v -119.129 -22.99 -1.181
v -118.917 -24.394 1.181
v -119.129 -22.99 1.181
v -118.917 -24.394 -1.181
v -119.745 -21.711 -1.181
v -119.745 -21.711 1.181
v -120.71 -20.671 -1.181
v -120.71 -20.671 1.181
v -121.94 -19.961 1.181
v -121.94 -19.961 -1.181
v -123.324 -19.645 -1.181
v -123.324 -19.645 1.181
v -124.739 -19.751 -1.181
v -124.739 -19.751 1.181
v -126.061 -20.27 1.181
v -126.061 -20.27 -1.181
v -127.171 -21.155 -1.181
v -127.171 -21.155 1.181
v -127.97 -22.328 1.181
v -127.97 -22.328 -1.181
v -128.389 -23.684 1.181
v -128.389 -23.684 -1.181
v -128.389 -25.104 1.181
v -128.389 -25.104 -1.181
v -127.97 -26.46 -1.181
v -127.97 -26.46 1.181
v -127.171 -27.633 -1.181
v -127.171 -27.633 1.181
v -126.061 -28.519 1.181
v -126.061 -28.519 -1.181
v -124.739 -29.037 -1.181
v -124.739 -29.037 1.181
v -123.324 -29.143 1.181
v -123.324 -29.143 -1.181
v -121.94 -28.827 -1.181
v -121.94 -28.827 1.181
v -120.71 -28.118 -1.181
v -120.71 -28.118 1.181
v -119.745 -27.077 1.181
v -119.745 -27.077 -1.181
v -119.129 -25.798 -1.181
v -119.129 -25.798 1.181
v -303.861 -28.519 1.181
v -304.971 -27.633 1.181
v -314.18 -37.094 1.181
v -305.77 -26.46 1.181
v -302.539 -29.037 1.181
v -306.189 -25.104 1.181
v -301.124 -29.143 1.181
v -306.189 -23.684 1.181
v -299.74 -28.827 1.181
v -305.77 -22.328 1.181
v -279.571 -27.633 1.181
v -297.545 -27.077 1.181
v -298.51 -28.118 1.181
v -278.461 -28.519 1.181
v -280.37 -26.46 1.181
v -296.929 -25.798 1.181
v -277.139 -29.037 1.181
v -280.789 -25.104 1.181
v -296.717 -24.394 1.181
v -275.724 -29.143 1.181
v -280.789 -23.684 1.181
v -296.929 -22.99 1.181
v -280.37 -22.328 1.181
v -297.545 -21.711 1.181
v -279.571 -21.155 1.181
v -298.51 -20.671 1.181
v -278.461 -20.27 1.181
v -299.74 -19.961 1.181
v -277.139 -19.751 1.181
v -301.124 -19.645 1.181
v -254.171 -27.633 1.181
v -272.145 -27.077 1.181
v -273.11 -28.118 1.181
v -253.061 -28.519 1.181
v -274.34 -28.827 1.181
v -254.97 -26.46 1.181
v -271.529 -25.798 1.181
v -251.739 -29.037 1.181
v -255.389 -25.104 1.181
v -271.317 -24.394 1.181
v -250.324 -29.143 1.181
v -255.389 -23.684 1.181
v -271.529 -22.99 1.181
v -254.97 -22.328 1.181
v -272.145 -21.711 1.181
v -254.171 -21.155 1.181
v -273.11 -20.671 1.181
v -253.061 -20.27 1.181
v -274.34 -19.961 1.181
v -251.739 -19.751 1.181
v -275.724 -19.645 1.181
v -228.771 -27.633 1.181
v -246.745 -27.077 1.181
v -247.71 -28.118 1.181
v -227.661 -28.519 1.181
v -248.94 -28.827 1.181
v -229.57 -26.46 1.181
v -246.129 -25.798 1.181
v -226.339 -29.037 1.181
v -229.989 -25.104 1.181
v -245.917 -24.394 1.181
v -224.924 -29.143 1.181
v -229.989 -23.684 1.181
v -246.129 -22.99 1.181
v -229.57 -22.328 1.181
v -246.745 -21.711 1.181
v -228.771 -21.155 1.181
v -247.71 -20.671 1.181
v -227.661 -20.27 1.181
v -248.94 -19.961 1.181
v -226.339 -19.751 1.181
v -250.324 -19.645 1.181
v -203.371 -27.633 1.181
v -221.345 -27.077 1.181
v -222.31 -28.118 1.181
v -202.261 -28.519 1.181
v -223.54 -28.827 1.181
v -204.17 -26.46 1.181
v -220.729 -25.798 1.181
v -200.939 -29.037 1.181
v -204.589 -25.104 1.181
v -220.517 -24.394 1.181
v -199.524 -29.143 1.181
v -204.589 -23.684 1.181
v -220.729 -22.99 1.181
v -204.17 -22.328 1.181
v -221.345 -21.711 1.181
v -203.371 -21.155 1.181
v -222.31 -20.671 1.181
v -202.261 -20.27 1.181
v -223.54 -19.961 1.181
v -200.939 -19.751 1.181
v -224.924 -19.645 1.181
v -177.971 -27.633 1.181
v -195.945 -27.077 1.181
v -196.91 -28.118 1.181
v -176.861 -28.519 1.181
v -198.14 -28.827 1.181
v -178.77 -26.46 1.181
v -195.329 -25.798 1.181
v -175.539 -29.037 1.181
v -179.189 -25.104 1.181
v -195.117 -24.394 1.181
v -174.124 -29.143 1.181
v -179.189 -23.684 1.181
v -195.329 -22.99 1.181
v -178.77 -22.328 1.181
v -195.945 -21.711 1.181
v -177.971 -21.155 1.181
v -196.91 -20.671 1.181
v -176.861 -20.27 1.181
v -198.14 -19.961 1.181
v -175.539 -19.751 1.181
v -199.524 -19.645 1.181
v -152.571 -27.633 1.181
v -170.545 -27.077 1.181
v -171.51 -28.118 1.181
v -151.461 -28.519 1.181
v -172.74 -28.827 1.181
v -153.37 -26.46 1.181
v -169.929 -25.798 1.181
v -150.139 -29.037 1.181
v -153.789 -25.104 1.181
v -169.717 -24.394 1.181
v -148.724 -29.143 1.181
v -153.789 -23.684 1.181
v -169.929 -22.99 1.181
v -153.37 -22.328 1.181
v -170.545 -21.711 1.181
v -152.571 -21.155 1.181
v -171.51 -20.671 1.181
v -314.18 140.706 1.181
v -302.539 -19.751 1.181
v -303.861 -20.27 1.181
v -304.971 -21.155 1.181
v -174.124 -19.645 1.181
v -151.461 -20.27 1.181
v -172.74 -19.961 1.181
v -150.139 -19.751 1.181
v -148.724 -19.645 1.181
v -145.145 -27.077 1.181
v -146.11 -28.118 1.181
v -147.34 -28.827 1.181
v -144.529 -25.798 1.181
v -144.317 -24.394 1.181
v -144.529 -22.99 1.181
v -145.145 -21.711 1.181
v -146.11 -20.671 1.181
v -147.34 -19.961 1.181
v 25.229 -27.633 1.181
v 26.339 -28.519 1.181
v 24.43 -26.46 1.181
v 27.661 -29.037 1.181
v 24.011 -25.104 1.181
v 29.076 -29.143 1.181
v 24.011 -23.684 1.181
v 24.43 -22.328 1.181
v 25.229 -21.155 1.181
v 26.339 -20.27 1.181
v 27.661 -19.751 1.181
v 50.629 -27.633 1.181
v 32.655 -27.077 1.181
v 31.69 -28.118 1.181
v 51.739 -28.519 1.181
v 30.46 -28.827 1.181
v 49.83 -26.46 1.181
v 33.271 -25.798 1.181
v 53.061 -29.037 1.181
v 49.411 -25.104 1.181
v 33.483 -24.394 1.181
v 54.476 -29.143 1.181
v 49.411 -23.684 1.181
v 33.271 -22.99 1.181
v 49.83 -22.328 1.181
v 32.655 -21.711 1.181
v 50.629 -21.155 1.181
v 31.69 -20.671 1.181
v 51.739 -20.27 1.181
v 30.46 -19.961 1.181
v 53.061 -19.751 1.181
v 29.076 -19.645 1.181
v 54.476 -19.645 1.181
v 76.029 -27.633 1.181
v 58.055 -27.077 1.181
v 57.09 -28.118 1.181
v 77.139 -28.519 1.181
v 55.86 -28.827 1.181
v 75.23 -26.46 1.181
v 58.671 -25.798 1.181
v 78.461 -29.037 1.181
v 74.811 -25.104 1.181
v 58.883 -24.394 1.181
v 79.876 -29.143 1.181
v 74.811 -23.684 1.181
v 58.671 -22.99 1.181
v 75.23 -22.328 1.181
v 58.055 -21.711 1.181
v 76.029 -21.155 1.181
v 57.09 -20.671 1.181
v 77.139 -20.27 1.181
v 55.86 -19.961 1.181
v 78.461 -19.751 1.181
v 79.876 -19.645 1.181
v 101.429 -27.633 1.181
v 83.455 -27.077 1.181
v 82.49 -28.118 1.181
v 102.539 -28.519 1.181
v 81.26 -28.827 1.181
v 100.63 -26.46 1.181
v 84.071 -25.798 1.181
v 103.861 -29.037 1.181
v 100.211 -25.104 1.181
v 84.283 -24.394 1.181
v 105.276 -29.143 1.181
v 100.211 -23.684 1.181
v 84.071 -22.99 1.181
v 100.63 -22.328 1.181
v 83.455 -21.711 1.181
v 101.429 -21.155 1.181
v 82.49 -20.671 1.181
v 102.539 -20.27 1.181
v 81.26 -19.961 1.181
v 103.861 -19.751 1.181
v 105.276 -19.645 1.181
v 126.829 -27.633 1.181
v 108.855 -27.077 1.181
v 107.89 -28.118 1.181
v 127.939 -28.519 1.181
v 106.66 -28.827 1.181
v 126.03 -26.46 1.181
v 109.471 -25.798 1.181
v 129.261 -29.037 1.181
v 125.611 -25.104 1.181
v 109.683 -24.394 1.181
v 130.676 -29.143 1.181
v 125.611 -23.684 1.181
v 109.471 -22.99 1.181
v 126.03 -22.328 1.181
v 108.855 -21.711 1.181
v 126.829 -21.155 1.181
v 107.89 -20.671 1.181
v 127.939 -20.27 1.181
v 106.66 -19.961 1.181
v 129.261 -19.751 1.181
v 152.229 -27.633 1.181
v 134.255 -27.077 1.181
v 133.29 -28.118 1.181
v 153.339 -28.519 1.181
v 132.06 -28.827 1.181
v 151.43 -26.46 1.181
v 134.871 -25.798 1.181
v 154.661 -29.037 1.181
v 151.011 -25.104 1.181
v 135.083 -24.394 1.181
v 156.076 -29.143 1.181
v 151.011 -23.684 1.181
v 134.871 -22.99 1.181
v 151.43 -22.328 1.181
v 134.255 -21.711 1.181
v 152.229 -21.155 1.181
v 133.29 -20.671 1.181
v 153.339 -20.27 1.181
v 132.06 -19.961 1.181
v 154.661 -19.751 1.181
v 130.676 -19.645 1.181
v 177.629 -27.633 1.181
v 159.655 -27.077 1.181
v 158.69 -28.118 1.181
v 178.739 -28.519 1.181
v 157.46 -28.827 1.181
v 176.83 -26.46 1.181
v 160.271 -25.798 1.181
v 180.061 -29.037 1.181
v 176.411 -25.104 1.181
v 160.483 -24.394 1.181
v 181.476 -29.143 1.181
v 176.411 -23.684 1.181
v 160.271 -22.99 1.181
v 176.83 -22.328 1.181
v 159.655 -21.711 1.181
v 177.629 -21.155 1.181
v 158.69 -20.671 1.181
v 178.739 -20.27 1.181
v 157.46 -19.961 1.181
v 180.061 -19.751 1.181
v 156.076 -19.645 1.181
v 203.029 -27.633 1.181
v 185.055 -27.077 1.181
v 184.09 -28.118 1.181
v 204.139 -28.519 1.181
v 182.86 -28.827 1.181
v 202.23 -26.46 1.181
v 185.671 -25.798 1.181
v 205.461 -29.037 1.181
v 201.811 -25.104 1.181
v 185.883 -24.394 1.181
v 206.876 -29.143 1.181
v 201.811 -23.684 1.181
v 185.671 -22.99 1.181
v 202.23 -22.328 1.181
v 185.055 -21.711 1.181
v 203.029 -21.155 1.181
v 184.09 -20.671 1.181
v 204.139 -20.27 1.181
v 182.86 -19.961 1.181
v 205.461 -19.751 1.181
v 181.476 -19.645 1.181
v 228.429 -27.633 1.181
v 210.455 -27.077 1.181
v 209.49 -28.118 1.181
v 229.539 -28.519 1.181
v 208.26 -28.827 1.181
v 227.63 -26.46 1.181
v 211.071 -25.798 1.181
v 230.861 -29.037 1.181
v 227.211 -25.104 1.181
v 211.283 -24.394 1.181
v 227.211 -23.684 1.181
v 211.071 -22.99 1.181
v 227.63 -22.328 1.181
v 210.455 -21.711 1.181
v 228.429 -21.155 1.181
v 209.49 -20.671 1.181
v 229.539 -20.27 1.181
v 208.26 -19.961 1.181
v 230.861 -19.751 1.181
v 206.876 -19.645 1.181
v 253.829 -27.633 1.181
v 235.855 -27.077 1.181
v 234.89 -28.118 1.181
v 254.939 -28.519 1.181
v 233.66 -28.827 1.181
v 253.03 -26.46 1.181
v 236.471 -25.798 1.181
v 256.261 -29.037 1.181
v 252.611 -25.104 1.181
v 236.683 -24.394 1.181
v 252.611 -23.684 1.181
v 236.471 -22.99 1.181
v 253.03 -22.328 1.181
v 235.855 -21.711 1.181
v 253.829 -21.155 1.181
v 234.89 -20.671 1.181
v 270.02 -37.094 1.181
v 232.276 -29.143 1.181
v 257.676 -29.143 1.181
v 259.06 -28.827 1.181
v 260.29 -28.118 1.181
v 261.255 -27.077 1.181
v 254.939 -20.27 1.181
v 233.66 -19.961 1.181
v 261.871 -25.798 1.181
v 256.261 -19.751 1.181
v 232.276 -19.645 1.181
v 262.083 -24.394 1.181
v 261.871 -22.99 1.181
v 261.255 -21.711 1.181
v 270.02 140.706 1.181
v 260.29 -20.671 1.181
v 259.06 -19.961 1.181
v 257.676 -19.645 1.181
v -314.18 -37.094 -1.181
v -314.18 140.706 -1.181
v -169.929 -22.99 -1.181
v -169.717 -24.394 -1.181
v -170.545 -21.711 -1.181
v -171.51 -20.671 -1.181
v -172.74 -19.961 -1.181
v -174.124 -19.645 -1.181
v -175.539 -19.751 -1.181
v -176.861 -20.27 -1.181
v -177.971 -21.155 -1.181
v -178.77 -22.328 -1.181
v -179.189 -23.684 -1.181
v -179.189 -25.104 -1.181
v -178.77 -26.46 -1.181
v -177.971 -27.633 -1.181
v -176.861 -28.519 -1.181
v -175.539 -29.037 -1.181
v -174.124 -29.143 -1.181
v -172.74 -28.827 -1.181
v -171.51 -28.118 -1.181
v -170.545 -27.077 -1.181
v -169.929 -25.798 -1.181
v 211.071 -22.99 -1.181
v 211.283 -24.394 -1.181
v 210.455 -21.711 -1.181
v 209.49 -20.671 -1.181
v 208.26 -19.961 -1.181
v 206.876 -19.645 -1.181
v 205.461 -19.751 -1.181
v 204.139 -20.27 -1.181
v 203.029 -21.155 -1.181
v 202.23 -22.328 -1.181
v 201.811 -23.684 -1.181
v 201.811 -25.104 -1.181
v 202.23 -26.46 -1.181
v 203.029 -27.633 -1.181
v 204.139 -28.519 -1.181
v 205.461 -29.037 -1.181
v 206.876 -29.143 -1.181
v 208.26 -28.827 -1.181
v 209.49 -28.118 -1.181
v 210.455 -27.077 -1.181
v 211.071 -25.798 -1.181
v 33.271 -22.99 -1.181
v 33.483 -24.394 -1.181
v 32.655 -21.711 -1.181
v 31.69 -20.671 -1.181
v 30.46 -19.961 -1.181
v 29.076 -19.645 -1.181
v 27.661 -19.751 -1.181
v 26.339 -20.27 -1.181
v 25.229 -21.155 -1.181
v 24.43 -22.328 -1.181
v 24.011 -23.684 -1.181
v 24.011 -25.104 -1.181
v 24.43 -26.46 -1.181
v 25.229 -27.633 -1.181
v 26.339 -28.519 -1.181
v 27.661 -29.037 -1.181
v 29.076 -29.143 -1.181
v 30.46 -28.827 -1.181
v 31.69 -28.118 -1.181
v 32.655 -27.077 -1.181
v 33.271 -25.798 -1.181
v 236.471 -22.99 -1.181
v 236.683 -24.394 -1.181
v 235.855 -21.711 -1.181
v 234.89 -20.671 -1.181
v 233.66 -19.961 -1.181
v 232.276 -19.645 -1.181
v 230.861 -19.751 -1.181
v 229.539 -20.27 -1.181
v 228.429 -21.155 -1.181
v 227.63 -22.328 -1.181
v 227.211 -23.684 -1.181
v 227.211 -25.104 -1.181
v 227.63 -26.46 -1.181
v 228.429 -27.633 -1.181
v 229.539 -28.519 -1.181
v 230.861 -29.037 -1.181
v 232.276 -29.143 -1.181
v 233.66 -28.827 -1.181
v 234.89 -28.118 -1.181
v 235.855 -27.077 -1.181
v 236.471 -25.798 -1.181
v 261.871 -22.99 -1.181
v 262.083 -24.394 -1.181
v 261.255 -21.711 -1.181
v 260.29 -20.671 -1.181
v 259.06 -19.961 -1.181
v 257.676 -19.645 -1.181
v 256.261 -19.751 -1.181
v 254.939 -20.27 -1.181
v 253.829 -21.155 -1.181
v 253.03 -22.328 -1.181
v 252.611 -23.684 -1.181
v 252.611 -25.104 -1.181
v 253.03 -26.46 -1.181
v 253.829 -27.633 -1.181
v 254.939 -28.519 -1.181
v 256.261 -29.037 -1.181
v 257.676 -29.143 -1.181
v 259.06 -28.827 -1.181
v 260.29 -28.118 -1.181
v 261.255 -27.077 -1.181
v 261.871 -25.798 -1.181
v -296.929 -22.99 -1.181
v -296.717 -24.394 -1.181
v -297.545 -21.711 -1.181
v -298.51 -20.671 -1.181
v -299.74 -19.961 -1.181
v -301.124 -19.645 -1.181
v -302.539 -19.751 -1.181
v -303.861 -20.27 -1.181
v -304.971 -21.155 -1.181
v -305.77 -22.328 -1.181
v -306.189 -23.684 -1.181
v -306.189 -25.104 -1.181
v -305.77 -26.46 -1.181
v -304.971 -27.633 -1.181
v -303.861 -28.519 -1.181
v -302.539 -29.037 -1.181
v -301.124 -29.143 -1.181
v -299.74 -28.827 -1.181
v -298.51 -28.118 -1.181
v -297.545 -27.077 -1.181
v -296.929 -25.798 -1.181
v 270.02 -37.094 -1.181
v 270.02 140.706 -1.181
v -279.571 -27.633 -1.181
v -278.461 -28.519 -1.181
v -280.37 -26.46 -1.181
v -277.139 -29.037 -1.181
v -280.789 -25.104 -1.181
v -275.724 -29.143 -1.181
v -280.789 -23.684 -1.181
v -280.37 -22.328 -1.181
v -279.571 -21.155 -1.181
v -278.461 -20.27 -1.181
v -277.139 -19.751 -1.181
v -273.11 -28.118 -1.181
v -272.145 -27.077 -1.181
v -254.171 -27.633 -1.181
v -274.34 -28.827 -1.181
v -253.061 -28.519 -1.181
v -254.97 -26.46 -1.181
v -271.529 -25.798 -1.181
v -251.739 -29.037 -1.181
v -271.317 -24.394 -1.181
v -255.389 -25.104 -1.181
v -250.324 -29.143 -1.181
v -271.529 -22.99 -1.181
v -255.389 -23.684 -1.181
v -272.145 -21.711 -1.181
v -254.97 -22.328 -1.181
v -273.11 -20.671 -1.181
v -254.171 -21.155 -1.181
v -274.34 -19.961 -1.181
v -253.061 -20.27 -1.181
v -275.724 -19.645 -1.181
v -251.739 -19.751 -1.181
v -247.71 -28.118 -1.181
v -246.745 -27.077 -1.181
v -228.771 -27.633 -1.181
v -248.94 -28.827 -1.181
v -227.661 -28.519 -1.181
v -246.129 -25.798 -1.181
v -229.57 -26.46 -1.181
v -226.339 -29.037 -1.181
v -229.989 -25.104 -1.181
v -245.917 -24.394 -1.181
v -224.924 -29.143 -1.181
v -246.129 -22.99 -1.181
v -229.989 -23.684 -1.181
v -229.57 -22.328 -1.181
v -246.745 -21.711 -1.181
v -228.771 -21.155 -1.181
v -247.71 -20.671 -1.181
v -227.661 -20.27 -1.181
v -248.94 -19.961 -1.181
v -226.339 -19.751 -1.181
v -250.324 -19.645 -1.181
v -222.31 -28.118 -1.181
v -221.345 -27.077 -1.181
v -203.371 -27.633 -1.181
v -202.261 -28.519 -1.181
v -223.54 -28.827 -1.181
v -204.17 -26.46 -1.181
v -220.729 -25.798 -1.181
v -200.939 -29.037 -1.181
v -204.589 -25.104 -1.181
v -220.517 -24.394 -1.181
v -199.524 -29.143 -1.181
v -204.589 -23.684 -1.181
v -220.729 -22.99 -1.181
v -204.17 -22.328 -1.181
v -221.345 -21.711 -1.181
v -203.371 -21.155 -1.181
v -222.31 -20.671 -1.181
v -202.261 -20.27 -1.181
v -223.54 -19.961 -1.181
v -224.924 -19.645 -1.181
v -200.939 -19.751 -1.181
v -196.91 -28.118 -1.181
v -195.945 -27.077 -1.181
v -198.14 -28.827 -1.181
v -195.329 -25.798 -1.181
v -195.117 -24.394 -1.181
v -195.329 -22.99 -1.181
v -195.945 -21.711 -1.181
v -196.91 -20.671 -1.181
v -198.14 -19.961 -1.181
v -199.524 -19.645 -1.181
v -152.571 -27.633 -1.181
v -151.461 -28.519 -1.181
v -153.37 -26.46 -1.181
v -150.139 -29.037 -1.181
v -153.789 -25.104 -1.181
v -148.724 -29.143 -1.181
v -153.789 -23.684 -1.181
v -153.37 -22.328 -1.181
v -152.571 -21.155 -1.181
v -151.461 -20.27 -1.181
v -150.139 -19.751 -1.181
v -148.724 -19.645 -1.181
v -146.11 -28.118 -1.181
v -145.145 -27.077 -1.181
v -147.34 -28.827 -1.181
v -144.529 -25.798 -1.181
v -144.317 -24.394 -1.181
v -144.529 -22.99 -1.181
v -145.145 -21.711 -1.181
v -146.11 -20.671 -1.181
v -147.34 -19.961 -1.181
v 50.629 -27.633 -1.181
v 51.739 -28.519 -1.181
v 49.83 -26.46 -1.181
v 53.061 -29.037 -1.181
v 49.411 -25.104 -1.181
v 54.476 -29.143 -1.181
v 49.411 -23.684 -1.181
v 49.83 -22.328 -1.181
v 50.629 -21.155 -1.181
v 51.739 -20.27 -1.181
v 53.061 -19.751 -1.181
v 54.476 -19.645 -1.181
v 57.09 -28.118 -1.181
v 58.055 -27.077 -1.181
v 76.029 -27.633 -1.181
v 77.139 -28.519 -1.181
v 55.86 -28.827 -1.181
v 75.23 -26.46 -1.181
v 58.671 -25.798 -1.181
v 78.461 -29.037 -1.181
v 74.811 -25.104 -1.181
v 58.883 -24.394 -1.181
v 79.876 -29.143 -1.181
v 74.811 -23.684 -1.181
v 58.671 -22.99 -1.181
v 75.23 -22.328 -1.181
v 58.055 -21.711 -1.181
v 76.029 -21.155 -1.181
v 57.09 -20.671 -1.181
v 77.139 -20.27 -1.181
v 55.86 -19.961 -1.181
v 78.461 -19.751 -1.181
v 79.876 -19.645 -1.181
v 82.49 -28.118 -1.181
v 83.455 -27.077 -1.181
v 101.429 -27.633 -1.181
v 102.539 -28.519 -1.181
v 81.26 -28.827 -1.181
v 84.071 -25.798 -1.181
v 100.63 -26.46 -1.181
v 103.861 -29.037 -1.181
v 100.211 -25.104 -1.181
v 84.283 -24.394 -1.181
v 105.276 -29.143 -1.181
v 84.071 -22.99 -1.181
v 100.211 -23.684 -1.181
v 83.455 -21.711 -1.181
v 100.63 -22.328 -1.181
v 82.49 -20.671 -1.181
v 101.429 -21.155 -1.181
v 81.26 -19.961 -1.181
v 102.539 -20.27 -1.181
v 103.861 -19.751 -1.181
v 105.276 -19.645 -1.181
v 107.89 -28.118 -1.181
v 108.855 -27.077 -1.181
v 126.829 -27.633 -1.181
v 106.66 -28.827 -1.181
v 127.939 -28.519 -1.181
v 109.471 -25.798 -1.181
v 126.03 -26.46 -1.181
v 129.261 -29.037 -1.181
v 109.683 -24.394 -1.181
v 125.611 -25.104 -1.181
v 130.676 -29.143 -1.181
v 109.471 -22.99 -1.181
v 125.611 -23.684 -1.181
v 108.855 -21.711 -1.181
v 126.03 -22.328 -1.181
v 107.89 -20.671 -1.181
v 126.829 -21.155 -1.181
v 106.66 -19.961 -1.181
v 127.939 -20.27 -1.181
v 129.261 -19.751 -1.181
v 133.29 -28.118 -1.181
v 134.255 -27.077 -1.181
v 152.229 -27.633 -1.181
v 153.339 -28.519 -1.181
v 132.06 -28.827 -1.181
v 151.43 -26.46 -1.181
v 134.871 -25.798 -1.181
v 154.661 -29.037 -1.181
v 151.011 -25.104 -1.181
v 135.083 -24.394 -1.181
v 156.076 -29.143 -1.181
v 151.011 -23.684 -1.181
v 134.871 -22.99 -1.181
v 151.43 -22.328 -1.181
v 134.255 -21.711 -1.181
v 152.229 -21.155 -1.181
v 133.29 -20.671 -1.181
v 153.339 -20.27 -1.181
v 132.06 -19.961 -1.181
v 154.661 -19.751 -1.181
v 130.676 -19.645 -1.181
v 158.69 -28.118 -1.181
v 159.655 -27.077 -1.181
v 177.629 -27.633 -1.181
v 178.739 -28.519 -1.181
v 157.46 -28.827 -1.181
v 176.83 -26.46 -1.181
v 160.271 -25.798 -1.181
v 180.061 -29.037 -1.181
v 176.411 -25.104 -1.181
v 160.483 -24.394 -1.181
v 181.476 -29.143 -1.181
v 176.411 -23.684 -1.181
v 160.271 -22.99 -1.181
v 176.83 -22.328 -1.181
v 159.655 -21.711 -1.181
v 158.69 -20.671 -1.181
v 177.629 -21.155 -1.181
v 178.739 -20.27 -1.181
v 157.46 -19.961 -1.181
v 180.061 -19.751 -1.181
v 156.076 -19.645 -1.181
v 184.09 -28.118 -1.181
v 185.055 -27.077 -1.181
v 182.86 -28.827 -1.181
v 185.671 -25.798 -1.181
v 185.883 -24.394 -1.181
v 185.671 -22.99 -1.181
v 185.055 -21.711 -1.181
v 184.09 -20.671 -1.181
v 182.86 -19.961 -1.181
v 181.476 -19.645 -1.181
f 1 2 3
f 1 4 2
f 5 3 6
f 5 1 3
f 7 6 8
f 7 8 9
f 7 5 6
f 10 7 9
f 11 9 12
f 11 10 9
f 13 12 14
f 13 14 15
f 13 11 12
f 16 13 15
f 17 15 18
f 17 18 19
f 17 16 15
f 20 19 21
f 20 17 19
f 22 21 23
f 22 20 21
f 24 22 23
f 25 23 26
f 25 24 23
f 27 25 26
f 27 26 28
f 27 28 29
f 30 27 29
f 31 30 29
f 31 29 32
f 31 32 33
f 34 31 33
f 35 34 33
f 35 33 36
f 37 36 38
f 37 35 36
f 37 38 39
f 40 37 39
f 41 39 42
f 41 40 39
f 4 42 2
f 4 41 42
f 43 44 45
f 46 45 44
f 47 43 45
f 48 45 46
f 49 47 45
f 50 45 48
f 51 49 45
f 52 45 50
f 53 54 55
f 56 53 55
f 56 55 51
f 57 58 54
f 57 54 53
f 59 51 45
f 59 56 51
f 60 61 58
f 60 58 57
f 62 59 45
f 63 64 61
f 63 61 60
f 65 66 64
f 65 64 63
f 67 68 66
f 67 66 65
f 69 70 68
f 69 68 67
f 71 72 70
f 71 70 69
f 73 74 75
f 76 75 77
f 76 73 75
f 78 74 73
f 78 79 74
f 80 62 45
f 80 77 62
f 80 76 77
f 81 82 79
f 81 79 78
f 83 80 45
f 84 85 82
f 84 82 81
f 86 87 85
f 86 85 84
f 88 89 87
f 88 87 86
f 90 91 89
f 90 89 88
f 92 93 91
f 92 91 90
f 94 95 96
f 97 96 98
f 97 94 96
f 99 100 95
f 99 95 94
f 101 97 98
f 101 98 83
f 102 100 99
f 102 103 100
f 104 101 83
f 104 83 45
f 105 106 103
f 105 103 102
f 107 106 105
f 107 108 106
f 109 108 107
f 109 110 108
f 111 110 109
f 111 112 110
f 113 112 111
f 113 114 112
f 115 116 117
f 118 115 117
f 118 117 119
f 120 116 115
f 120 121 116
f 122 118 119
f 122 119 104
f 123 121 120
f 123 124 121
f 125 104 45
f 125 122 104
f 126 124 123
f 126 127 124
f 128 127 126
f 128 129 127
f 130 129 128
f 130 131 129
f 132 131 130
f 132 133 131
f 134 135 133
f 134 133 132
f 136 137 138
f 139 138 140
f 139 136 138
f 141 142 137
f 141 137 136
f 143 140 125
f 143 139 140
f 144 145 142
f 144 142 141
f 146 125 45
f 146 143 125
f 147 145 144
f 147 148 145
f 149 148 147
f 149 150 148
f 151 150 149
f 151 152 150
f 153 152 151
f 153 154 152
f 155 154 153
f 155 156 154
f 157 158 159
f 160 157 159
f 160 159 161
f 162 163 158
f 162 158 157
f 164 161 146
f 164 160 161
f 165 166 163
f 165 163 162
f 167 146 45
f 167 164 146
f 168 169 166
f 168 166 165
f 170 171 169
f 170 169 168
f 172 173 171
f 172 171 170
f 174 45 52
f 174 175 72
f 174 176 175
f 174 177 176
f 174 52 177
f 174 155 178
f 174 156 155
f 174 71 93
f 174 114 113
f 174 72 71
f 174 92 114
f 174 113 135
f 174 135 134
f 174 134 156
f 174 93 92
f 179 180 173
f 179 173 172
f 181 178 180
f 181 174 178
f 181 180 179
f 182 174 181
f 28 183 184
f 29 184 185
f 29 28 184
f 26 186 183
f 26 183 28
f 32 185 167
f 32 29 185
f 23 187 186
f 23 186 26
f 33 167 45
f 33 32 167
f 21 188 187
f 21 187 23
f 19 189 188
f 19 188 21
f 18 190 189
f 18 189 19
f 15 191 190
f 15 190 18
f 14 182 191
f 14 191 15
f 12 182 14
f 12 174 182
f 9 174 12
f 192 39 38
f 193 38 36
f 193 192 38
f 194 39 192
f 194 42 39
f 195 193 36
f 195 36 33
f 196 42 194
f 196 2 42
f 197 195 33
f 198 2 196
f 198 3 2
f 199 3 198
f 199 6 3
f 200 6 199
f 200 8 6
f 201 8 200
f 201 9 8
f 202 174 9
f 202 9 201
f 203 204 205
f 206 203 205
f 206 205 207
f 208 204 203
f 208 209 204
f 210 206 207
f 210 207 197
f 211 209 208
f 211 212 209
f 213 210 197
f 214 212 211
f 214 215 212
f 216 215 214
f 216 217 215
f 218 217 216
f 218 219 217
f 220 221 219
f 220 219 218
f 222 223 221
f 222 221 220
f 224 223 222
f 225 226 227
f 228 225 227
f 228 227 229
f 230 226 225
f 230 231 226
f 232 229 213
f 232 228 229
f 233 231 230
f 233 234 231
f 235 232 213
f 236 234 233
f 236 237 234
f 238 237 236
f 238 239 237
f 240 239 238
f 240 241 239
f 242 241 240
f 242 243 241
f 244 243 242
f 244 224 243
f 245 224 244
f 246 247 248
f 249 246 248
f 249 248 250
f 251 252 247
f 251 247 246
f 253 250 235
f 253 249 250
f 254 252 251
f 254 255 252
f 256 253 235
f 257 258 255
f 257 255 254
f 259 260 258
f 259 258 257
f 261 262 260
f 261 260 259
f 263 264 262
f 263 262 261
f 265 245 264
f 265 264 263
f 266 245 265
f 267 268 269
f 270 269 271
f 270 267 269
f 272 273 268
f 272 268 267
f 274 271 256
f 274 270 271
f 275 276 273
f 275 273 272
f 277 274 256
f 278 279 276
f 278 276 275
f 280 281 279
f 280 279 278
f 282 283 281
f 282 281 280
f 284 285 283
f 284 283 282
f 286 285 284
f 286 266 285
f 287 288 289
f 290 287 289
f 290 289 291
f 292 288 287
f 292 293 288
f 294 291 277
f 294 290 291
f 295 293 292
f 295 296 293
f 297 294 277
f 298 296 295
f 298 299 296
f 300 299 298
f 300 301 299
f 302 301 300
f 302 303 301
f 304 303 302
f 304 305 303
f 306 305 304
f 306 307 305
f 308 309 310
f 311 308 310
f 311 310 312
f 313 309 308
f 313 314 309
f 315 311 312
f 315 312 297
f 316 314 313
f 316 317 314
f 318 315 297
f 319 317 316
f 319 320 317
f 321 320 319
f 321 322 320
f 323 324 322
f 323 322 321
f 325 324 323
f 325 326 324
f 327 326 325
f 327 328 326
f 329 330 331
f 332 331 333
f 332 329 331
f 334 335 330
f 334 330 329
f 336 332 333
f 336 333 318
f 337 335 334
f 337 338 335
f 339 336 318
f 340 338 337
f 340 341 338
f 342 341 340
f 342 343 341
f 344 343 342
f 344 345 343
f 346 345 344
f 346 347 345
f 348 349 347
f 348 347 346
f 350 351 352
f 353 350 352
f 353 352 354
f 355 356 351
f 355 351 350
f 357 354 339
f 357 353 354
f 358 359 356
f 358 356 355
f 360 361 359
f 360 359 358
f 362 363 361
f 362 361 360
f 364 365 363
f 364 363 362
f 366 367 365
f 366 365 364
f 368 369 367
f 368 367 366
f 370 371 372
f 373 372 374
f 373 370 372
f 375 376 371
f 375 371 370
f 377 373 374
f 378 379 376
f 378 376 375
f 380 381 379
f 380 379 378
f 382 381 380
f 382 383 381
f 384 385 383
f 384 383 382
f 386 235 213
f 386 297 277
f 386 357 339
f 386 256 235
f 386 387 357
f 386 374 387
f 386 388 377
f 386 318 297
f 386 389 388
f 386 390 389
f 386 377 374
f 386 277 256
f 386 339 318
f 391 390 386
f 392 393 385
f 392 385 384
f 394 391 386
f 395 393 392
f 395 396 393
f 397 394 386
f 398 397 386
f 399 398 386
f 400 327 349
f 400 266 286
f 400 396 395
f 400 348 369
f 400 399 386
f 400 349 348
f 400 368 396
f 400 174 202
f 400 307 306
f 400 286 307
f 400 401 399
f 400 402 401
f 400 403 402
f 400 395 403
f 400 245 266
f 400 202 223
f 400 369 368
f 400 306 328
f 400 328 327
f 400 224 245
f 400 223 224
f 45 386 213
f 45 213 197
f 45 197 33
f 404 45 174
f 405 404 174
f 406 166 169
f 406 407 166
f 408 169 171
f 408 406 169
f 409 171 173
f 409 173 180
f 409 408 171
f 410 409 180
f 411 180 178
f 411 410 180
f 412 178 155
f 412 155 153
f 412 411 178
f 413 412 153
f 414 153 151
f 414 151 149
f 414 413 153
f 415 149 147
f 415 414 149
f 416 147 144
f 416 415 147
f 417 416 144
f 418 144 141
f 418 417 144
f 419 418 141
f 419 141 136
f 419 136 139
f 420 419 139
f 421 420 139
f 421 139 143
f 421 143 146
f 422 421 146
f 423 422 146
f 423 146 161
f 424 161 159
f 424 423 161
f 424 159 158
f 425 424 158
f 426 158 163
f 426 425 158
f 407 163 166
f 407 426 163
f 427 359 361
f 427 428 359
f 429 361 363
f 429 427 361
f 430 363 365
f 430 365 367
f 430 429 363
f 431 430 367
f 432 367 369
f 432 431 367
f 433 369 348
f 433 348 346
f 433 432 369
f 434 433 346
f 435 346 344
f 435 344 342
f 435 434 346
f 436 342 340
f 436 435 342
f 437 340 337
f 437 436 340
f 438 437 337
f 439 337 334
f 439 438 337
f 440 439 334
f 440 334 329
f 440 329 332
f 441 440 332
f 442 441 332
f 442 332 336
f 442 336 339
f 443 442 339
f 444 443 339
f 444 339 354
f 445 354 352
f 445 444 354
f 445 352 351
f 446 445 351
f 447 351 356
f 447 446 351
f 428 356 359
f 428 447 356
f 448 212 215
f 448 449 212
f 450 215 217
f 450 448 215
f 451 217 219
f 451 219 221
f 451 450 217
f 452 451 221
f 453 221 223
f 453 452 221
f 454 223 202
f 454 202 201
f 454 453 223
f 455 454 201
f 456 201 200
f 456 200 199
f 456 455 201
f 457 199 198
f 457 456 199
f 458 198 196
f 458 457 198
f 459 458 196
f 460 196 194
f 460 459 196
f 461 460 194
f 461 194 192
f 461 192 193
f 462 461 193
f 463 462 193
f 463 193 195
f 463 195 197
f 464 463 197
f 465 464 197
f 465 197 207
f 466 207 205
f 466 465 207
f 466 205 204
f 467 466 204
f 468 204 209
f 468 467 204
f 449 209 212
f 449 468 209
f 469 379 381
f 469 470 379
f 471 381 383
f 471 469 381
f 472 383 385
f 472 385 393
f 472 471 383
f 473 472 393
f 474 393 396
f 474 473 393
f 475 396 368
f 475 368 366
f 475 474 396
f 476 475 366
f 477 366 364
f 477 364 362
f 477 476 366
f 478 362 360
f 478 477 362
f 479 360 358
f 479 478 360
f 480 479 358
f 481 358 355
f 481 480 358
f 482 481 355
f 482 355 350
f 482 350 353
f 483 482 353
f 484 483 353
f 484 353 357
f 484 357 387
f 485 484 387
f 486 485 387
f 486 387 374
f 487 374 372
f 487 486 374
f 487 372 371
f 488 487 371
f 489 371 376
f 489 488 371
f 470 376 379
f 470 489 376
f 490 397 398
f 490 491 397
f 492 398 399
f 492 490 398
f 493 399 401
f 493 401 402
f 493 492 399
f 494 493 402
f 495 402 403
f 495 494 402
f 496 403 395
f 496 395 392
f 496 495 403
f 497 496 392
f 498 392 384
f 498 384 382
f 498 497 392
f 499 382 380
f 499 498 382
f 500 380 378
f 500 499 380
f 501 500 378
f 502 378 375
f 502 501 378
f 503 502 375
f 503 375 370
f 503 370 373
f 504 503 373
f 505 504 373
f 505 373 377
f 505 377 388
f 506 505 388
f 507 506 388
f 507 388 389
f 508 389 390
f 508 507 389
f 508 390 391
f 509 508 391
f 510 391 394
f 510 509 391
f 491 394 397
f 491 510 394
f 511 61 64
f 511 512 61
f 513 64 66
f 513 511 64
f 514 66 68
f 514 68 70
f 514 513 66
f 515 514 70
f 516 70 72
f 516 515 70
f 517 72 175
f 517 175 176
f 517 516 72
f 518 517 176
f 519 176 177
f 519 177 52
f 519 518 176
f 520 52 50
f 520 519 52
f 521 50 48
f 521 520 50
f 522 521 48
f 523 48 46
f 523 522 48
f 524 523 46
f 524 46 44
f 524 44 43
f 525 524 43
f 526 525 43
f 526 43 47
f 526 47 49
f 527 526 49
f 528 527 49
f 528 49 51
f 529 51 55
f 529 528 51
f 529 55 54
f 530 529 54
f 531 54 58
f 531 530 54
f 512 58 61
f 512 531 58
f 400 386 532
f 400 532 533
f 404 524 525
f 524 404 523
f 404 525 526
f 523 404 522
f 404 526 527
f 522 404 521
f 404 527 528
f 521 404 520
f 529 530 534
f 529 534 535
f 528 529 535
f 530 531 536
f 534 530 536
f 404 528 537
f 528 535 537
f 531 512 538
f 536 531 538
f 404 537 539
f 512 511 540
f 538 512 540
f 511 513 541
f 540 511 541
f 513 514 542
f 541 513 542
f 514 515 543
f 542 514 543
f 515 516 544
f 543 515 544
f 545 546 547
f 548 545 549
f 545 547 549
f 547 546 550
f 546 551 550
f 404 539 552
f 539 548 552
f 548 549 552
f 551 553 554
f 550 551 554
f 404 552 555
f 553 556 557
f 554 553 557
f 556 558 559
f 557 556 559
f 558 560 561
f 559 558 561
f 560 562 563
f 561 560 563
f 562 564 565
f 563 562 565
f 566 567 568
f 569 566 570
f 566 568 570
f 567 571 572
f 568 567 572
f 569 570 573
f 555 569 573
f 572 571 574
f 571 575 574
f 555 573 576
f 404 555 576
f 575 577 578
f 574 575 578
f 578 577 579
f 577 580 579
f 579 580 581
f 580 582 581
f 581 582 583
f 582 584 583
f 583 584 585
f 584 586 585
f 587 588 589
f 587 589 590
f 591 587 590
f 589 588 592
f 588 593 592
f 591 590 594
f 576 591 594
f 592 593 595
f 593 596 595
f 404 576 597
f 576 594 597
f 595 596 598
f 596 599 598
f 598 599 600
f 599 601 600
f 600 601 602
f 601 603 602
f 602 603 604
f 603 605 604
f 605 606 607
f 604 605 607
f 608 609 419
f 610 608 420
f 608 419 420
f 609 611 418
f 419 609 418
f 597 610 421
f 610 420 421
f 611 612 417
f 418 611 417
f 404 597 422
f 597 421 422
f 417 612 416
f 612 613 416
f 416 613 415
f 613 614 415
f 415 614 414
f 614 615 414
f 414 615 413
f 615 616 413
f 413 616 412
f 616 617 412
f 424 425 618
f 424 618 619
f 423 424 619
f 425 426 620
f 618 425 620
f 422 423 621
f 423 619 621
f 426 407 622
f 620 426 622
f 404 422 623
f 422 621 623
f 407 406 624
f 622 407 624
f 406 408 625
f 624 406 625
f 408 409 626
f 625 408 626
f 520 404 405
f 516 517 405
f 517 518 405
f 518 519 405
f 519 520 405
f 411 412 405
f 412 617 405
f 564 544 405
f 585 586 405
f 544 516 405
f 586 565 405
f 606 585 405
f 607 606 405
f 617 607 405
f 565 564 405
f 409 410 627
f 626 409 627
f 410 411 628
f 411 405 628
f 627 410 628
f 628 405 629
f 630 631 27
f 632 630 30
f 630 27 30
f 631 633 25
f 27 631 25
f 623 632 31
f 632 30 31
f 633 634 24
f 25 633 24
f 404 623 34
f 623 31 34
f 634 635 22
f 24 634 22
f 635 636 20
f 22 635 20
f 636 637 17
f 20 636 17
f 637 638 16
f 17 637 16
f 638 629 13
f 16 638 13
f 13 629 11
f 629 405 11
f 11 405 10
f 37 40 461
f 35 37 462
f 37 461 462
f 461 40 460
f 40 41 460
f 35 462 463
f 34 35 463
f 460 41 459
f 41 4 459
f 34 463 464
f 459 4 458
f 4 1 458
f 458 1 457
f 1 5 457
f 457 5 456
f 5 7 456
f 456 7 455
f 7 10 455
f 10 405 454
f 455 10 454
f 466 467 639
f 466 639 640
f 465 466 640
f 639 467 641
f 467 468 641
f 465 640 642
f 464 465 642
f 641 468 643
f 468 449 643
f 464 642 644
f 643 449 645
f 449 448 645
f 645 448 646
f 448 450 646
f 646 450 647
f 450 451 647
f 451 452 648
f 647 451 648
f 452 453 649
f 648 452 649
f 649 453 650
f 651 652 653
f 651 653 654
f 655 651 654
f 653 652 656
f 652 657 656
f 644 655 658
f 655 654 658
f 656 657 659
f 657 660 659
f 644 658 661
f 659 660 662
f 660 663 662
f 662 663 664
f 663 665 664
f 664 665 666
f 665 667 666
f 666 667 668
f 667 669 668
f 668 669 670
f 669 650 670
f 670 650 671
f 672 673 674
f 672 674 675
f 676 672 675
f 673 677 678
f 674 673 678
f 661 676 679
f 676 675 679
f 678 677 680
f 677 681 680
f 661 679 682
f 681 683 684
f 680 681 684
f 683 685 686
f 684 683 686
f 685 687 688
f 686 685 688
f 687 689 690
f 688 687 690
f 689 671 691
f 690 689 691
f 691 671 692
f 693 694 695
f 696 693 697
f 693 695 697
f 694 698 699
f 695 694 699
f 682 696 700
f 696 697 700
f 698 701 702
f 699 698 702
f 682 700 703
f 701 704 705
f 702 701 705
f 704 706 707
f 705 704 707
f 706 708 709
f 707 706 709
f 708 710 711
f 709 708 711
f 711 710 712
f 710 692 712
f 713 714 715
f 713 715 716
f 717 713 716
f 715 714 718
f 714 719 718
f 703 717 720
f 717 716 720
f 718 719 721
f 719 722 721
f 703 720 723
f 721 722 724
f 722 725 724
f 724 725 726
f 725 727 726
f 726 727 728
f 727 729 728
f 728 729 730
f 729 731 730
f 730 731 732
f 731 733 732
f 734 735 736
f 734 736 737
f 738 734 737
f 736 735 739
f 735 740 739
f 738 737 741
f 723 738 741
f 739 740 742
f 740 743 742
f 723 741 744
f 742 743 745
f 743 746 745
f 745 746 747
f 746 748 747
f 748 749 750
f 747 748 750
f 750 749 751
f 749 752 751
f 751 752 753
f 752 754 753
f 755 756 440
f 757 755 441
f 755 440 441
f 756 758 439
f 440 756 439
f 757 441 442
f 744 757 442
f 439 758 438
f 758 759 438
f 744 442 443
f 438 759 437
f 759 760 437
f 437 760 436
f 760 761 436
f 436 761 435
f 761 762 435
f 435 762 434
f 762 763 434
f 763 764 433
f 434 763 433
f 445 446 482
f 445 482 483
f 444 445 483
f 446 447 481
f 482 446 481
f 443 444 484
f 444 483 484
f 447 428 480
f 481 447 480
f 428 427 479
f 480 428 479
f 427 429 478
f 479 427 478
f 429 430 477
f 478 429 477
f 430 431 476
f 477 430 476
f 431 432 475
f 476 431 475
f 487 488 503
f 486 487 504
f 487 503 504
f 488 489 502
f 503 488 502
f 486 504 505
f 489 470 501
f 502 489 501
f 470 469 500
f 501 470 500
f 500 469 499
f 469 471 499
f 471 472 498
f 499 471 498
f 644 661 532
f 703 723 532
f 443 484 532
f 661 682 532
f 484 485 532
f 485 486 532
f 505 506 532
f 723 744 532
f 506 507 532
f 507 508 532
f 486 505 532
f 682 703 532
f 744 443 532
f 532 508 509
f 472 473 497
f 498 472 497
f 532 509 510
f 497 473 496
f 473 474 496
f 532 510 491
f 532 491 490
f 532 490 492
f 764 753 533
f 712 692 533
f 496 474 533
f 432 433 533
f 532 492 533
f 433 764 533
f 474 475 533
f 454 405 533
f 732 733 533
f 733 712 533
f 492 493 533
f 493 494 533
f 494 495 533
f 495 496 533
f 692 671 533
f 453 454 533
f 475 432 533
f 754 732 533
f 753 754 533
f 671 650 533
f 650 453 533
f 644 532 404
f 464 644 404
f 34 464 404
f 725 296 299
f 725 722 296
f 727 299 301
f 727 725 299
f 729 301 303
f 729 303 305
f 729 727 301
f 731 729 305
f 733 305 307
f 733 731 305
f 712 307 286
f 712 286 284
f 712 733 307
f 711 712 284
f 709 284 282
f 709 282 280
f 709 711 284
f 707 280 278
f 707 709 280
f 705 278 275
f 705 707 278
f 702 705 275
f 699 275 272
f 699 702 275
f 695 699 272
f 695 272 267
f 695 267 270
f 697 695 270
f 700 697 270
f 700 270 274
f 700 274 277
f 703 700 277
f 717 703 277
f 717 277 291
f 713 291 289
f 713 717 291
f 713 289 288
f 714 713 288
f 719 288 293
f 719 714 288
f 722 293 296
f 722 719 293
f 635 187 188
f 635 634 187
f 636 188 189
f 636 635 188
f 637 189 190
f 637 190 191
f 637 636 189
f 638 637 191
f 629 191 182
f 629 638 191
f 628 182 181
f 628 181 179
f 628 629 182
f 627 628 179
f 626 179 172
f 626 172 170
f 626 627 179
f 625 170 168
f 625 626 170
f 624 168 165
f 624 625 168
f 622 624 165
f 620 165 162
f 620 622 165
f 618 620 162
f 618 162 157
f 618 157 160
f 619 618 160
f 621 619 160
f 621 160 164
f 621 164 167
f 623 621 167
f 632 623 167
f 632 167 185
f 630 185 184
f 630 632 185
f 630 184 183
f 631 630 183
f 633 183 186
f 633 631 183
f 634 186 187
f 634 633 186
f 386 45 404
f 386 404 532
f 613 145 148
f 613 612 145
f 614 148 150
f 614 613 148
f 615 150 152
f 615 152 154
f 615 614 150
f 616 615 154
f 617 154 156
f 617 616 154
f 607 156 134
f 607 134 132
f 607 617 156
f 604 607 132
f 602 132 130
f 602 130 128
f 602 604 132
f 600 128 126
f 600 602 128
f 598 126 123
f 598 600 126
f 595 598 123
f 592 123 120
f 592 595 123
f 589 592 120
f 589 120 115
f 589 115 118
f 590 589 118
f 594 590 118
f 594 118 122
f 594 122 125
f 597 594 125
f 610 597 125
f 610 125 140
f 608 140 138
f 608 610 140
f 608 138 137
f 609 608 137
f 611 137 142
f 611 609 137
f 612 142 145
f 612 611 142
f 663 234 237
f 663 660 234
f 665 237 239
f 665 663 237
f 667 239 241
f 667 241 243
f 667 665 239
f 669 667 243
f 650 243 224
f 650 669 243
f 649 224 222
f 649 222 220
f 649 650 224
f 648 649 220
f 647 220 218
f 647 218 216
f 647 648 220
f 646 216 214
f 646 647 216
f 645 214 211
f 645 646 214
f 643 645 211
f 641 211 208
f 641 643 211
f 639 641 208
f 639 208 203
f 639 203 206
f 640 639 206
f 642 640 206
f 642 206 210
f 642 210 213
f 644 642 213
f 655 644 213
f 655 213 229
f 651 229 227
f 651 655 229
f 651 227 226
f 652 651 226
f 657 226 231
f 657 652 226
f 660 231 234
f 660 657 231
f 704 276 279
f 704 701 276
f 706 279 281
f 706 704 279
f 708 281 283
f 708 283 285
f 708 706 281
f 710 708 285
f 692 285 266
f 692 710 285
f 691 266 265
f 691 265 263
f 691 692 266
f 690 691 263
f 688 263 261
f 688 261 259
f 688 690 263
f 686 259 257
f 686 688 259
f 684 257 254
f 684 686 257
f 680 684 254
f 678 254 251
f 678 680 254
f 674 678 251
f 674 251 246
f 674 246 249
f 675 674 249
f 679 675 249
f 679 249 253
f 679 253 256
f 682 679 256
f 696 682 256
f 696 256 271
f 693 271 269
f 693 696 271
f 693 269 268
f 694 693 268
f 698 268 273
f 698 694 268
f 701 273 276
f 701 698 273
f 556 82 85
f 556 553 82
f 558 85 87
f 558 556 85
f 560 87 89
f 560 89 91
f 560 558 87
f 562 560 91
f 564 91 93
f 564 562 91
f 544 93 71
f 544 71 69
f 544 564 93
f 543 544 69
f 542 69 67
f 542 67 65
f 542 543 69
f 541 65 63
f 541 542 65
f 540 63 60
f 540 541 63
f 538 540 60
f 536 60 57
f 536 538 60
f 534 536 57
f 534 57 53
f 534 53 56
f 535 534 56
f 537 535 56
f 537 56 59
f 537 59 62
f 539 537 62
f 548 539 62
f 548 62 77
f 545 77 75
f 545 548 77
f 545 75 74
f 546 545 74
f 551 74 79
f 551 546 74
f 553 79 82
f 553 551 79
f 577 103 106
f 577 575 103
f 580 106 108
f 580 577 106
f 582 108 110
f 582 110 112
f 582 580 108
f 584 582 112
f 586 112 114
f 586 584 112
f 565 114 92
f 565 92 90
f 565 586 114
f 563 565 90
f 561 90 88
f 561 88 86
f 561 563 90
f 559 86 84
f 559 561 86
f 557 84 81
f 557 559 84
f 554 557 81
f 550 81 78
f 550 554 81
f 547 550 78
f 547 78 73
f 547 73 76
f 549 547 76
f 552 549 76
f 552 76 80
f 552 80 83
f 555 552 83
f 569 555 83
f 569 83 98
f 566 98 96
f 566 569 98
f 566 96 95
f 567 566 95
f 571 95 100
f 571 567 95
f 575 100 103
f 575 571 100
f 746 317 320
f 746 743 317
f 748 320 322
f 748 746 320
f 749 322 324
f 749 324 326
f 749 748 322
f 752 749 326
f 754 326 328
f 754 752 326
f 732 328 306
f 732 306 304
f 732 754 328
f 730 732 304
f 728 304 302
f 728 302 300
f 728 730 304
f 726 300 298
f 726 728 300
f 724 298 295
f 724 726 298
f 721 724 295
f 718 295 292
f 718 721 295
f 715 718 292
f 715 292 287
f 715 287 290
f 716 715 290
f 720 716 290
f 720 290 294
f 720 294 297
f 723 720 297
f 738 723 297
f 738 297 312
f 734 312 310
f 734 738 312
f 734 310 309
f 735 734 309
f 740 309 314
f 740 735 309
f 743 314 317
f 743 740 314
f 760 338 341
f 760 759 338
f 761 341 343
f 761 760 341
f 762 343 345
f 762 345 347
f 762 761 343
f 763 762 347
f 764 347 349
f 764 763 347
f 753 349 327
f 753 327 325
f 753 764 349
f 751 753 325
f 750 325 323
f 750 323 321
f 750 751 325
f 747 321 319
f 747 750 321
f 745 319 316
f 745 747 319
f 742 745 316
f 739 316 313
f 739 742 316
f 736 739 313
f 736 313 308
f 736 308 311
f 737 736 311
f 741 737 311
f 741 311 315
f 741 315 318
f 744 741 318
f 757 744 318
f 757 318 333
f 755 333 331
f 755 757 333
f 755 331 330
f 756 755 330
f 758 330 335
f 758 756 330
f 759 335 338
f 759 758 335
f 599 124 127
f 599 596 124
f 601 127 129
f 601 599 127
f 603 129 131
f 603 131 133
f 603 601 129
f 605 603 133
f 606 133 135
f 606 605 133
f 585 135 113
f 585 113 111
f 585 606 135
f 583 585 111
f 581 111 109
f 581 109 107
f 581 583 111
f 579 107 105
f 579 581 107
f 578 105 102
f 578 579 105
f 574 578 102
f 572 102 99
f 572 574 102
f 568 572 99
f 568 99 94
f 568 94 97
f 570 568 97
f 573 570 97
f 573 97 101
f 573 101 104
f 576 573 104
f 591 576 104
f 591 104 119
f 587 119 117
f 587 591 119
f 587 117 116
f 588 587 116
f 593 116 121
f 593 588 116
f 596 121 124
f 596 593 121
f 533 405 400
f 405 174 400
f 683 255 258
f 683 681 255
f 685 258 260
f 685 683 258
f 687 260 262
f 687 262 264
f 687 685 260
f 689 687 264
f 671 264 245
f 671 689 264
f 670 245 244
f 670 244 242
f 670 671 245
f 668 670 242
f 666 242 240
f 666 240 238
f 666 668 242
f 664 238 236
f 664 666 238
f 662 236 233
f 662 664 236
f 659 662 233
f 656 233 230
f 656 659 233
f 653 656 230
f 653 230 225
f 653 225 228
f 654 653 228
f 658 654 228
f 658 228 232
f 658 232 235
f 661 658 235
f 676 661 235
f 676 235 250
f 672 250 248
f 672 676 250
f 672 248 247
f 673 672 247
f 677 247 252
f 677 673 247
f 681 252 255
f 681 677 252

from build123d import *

# Parameters (mm, degrees)
SKETCH1_W           = 584.2
SKETCH1_H           = 177.8
SKETCH1_R           = 4.7625
BOSS_EXTRUDE1_DEPTH = 1.1811


with BuildPart() as part:
    # Sketch1 → Boss-Extrude1 (new, symmetric)
    with BuildSketch(Plane.XY):
        with Locations((-22.079522351, 51.805915244)):
            Rectangle(SKETCH1_W, SKETCH1_H)
        with Locations((-301.479522351, -24.394084756)):
            Circle(SKETCH1_R, mode=Mode.SUBTRACT)
        with Locations((-276.079522351, -24.394084756)):
            Circle(SKETCH1_R, mode=Mode.SUBTRACT)
        with Locations((-250.679522351, -24.394084756)):
            Circle(SKETCH1_R, mode=Mode.SUBTRACT)
        with Locations((-225.279522351, -24.394084756)):
            Circle(SKETCH1_R, mode=Mode.SUBTRACT)
        with Locations((-199.879522351, -24.394084756)):
            Circle(SKETCH1_R, mode=Mode.SUBTRACT)
        with Locations((-174.479522351, -24.394084756)):
            Circle(SKETCH1_R, mode=Mode.SUBTRACT)
        with Locations((-149.079522351, -24.394084756)):
            Circle(SKETCH1_R, mode=Mode.SUBTRACT)
        with Locations((-123.679522351, -24.394084756)):
            Circle(SKETCH1_R, mode=Mode.SUBTRACT)
        with Locations((28.720477649, -24.394084756)):
            Circle(SKETCH1_R, mode=Mode.SUBTRACT)
        with Locations((54.120477649, -24.394084756)):
            Circle(SKETCH1_R, mode=Mode.SUBTRACT)
        with Locations((79.520477649, -24.394084756)):
            Circle(SKETCH1_R, mode=Mode.SUBTRACT)
        with Locations((104.920477649, -24.394084756)):
            Circle(SKETCH1_R, mode=Mode.SUBTRACT)
        with Locations((130.320477649, -24.394084756)):
            Circle(SKETCH1_R, mode=Mode.SUBTRACT)
        with Locations((155.720477649, -24.394084756)):
            Circle(SKETCH1_R, mode=Mode.SUBTRACT)
        with Locations((181.120477649, -24.394084756)):
            Circle(SKETCH1_R, mode=Mode.SUBTRACT)
        with Locations((206.520477649, -24.394084756)):
            Circle(SKETCH1_R, mode=Mode.SUBTRACT)
        with Locations((231.920477649, -24.394084756)):
            Circle(SKETCH1_R, mode=Mode.SUBTRACT)
        with Locations((257.320477649, -24.394084756)):
            Circle(SKETCH1_R, mode=Mode.SUBTRACT)
    extrude(amount=BOSS_EXTRUDE1_DEPTH, both=True)


solid = part.part
